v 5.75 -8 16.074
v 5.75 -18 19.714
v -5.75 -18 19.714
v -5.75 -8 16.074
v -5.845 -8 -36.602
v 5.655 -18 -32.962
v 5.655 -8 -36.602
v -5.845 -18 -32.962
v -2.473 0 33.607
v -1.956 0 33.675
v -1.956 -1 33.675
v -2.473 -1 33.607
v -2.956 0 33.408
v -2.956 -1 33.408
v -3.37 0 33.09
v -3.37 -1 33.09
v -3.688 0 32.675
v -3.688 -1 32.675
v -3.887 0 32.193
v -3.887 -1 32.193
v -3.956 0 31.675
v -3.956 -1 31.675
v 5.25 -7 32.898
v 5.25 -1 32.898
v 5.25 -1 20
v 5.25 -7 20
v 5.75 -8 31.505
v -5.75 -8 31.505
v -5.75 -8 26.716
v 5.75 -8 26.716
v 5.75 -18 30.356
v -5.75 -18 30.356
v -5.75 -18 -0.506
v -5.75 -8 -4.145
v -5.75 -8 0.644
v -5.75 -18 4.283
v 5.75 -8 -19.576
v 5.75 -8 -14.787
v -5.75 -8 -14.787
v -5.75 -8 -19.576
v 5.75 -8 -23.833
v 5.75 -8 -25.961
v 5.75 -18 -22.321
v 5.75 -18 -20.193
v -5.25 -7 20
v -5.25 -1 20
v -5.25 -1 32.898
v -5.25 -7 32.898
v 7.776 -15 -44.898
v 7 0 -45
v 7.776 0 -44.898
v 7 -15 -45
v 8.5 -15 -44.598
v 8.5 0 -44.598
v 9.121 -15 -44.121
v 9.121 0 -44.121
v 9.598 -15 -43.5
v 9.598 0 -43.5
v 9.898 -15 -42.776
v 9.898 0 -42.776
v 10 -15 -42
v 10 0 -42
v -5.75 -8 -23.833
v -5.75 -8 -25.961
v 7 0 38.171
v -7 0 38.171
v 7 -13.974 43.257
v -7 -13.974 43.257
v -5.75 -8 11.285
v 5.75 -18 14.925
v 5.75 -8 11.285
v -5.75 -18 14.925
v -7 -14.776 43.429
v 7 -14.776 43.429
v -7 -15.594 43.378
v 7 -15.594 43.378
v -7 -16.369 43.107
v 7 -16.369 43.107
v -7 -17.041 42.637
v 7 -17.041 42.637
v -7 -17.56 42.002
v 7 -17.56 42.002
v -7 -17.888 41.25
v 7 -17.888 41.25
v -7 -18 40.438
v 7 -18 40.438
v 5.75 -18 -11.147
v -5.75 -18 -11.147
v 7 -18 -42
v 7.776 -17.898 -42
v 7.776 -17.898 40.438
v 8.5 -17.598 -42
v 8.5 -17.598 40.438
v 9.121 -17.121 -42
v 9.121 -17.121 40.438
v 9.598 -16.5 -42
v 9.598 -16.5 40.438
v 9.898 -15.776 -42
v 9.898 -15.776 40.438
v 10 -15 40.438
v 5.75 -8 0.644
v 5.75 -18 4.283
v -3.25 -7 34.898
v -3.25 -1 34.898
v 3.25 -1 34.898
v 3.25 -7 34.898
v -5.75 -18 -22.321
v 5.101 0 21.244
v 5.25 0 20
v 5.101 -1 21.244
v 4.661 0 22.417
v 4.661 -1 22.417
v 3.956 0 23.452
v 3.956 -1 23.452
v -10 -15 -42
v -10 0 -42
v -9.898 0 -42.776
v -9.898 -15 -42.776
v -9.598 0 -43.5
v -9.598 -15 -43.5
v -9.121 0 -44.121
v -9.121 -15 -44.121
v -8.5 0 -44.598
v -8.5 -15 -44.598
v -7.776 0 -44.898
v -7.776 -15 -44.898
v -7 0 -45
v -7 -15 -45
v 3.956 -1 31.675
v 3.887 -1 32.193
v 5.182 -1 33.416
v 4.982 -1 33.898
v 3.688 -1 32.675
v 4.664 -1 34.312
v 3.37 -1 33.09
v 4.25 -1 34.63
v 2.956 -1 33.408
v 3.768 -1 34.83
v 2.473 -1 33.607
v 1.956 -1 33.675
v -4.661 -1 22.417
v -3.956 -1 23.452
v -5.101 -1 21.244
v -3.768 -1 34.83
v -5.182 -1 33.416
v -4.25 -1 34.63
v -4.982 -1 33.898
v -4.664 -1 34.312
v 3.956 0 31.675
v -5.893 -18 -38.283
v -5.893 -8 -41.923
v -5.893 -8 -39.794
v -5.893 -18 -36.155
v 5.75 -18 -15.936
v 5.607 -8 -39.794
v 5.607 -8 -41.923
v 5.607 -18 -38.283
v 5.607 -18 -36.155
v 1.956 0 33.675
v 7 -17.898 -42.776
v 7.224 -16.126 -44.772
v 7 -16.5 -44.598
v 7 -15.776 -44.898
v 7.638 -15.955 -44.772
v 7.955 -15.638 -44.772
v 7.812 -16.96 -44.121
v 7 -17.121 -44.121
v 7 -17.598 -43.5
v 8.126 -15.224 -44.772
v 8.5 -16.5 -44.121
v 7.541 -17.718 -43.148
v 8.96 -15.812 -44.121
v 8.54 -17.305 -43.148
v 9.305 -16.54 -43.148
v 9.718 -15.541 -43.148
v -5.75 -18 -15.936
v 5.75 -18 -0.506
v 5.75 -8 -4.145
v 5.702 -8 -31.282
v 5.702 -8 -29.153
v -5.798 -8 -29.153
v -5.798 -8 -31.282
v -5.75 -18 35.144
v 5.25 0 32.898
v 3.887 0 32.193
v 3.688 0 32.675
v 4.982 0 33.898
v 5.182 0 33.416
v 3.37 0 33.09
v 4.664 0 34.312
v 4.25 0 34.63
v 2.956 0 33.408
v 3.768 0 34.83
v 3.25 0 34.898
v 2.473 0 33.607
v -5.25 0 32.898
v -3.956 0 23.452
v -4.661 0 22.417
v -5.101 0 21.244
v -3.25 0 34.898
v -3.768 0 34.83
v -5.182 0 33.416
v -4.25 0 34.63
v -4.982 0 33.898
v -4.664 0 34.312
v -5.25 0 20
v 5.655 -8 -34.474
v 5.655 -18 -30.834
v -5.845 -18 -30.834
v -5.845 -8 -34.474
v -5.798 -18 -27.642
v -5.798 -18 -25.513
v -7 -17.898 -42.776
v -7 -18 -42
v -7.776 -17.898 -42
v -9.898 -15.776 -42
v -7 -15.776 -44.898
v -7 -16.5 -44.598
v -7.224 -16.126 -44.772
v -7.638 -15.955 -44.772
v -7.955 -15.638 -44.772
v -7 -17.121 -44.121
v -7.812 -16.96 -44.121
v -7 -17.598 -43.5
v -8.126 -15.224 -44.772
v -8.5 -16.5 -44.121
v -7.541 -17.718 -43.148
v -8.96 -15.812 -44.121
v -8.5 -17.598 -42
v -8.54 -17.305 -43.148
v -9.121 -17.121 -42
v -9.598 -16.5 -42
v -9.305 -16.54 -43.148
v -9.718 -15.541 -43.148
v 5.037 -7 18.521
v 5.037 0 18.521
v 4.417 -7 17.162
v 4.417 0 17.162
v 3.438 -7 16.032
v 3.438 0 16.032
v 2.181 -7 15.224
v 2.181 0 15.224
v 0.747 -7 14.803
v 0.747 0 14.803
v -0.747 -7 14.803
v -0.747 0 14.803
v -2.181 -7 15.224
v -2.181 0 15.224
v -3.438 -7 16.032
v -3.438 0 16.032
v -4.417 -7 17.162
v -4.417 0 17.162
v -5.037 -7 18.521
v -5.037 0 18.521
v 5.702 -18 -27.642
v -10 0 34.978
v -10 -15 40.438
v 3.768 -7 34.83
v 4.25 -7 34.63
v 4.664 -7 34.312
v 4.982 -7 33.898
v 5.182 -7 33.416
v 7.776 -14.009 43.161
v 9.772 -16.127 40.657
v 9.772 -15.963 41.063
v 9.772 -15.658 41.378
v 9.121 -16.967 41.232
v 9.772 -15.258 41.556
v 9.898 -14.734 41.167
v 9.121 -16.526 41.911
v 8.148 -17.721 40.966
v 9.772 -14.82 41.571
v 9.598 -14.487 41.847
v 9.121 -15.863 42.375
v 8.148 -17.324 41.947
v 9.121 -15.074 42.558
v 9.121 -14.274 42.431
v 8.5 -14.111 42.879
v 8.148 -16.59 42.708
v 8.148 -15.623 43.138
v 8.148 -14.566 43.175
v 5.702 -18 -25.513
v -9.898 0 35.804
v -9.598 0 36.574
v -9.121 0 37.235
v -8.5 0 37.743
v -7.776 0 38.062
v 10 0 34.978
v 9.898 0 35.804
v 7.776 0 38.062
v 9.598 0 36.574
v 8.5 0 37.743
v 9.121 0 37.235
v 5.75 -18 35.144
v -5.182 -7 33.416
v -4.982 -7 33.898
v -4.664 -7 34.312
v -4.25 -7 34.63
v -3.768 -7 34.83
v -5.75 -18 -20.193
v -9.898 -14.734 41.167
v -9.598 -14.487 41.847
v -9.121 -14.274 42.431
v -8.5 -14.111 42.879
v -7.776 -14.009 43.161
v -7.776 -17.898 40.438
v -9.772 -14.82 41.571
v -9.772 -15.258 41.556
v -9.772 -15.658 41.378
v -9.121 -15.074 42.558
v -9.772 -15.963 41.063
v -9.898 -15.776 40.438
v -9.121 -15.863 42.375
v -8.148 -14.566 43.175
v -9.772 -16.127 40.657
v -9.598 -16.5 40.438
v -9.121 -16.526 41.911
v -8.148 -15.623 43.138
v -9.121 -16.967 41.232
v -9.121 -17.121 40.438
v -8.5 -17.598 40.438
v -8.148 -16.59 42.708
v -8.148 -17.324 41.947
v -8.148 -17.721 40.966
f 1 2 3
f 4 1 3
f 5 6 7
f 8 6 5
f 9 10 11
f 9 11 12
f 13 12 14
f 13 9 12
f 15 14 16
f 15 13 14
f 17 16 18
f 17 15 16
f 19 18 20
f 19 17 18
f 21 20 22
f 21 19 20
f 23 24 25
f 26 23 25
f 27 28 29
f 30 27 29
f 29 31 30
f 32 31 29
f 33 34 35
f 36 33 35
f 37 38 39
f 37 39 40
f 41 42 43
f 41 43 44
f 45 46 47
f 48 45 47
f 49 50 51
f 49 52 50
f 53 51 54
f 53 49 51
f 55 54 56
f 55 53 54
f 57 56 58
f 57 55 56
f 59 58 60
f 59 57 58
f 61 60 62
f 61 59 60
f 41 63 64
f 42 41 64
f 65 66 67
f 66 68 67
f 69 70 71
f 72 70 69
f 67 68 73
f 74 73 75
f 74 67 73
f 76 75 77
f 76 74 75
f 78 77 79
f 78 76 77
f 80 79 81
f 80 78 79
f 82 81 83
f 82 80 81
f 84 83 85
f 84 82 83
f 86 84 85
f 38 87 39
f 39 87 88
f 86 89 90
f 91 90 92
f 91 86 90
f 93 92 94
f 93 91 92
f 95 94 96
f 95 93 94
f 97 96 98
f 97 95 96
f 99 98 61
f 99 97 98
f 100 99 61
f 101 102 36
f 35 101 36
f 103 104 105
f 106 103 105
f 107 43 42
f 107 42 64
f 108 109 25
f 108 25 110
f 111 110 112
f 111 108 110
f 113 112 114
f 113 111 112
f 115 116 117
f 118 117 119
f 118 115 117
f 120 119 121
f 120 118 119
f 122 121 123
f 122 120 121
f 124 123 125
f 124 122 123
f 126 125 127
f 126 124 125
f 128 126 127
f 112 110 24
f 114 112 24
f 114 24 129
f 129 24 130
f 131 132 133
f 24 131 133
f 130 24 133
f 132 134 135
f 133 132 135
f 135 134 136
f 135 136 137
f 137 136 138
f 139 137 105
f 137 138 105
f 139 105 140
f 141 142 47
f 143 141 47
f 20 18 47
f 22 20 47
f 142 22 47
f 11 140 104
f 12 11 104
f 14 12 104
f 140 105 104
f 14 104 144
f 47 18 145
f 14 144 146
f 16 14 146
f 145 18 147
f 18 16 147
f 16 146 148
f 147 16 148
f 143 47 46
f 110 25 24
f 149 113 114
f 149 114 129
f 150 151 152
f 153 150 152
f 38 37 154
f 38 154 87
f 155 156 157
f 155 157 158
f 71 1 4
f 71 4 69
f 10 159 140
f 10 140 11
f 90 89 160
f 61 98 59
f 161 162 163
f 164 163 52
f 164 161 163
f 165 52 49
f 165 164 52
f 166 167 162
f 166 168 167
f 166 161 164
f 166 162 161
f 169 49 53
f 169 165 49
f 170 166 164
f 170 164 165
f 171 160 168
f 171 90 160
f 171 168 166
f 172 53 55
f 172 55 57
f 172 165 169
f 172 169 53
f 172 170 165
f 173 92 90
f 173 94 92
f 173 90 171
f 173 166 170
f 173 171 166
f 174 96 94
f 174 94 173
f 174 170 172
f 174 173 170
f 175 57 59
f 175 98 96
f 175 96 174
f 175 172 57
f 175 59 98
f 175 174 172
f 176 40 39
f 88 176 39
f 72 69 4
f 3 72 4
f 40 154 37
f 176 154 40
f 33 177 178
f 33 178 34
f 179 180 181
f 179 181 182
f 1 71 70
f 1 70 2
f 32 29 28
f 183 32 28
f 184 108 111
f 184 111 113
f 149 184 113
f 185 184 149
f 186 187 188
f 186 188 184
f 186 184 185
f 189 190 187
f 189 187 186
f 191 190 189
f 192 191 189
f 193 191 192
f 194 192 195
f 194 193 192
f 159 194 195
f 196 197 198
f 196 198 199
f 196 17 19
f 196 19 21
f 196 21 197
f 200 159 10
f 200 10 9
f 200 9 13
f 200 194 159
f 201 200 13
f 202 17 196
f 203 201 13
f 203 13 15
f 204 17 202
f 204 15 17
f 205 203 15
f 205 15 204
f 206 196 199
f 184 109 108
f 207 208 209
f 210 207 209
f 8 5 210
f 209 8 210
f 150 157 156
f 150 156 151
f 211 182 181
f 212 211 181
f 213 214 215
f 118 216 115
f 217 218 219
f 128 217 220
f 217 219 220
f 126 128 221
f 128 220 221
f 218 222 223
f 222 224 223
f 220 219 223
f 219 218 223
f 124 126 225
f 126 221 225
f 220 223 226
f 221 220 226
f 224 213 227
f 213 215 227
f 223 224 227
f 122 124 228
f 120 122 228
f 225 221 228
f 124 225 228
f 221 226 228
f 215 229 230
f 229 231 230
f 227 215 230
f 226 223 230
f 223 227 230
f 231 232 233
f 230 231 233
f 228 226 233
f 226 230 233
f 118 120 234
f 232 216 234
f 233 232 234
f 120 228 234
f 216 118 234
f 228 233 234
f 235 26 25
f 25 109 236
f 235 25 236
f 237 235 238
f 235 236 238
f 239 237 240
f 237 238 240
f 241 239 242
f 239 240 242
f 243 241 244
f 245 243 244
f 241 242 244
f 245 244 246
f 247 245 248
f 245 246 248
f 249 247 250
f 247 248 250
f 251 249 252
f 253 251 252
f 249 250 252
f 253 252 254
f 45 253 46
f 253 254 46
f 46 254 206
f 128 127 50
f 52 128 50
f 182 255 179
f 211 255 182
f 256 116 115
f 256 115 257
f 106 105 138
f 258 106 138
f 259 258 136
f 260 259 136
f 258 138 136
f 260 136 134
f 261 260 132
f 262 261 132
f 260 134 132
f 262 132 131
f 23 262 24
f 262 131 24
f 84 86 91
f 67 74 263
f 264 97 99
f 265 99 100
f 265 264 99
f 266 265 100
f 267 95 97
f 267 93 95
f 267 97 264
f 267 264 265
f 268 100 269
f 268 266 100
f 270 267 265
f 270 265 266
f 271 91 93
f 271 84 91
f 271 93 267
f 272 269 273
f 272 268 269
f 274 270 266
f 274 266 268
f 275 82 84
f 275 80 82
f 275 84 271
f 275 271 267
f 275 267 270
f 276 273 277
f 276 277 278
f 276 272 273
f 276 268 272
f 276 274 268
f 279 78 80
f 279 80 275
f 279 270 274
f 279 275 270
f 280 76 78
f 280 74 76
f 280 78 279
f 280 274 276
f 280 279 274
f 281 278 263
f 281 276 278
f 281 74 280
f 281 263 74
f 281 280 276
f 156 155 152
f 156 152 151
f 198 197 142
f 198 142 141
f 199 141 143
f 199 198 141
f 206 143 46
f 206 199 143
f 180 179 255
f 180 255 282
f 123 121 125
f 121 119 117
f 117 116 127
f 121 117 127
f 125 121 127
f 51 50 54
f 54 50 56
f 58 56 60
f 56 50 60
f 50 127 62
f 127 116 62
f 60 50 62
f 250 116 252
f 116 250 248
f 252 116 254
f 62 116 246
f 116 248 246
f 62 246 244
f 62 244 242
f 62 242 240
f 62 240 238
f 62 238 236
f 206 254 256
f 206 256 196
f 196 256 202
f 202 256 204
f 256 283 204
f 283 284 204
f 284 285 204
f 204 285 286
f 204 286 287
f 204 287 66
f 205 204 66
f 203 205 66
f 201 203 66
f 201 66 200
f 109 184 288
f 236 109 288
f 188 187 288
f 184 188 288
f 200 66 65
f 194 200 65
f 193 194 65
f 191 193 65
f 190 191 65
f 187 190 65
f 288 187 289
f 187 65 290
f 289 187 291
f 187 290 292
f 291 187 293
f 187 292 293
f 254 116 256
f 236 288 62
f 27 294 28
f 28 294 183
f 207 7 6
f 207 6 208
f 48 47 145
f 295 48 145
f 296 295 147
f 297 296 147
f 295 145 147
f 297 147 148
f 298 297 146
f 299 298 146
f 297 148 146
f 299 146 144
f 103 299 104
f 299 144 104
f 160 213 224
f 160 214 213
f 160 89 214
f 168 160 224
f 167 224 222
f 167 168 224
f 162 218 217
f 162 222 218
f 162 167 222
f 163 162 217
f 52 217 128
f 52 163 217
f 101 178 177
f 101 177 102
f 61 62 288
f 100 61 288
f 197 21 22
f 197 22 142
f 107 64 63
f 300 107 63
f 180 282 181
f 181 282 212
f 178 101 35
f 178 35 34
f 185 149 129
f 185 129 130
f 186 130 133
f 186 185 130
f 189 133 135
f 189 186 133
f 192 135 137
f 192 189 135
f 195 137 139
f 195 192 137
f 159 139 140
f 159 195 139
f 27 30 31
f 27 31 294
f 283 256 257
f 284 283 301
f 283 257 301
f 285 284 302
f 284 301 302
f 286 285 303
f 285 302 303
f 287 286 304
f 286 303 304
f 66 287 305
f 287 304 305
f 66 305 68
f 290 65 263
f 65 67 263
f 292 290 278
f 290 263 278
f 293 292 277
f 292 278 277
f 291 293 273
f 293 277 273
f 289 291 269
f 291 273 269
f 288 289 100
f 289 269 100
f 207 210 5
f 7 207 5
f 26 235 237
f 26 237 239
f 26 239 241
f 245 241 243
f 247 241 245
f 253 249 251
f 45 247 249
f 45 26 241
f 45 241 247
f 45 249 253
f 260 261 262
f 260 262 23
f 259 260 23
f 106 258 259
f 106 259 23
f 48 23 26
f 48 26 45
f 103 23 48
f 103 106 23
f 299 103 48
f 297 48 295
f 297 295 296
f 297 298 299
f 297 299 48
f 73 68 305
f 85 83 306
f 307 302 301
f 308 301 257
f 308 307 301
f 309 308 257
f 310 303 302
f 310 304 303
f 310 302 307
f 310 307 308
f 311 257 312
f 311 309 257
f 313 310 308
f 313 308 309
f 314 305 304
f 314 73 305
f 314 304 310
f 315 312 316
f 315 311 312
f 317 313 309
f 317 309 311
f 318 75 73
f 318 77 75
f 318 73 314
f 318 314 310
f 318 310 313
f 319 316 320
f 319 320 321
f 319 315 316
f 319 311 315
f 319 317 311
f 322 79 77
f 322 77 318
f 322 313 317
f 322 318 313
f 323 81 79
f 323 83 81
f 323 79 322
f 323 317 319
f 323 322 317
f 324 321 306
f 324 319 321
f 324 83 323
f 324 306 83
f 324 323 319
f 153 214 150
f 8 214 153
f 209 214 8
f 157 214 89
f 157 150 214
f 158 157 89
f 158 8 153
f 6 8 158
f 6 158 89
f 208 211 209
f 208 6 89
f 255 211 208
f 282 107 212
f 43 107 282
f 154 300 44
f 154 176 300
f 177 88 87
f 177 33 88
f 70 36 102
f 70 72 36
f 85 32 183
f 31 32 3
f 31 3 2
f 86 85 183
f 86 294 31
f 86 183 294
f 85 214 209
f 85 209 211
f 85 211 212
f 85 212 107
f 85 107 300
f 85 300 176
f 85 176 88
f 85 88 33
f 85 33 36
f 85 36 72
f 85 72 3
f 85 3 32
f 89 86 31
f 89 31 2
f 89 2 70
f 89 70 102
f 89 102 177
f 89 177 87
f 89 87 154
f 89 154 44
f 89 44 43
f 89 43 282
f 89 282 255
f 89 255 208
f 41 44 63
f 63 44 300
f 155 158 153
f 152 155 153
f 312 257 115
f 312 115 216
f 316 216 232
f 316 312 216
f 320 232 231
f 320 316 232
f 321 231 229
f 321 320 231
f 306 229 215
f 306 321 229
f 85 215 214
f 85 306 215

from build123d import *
from build123d import SkipClean  # not in build123d's __all__

# Parameters (mm, degrees)
F0_W      = 20
F0_H      = 90
F1_DEPTH  = 18
F4_W      = 11.5
F4_H      = 4.5
F4_H_2    = 2
F6_REACH  = 51.4753785472
F8_W      = 43.5633249581
F8_H      = 43.13050583
F9_DEPTH  = 16.4
F10_R     = 3
F12_DEPTH = 7
F13_DEPTH = 1


with BuildPart() as f1:
    # F0 (on Front) → F1 (new body)
    with BuildSketch(Plane.XZ):
        Rectangle(F0_W, F0_H)
    extrude(amount=F1_DEPTH)

    f6_end = Plane(origin=(0, -8, 0), x_dir=(0, 0, -1), z_dir=(0, -1, 0))
    # F4 (on face) → F6 (cut, up to a plane its end follows)
    with BuildSketch(Plane(origin=(0, -30.357121206, 11.049088517), x_dir=(-1, 0, 0), z_dir=(0, 0.9396926208, -0.3420201433))):
        with Locations((0, 24.6185707509)):
            Rectangle(F4_W, F4_H)
        with Locations((0, 10.1185707509)):
            Rectangle(F4_W, F4_H)
        with Locations((0, -4.3814292491)):
            Rectangle(F4_W, F4_H)
        with Locations((0, -18.8814292491)):
            Rectangle(F4_W, F4_H)
        with Locations((0, -26.1314292491)):
            Rectangle(F4_W, F4_H_2)
        with Locations((0.0476672364, -31.1312020274)):
            Rectangle(F4_W, F4_H_2)
        with Locations((0.0953344728, -36.1309748057)):
            Rectangle(F4_W, F4_H_2)
        with Locations((0.1430017093, -41.130747584)):
            Rectangle(F4_W, F4_H_2)
    f6_long = extrude(amount=F6_REACH, mode=Mode.PRIVATE)
    add(split(f6_long, bisect_by=f6_end, keep=Keep.TOP, mode=Mode.PRIVATE), mode=Mode.SUBTRACT)

    # F8 (on offset) → F9 (cut)
    with BuildSketch(Plane(origin=(0, 12.2677737091, 33.7054312527), x_dir=(1, 0, 0), z_dir=(0, -0.3420201433, -0.9396926208))):
        with Locations((0, 21.565252915)):
            Rectangle(F8_W, F8_H)
    extrude(amount=-F9_DEPTH, mode=Mode.SUBTRACT)

    # F10
    f10_edges = [f1.edges().sort_by_distance(p)[0] for p in [
        (-10, -18, -0.139),
        (0, -18, 44.722),
        (10, -18, -0.139),
        (0, -18, -45),
        (-10, -9, 41.446268),
        (10, -9, 41.446268),
        (-10, -9, -45),
        (10, -9, -45),
    ]]
    fillet(f10_edges, radius=F10_R)

    # F11 (on face) → F12 (cut)
    with BuildSketch(Plane(origin=(0, 0, 0), x_dir=(-1, 0, 0), z_dir=(0, 1, 0))):
        with BuildLine():
            ThreePointArc((-5.25, 20), (0, 14.75), (5.25, 20))
            ThreePointArc((5.25, 20), (4.9157552788, 21.8433258091), (3.9555809377, 23.4519385054))
            ThreePointArc((3.9555809377, 23.4519385054), (0, 25.25), (-3.9555809377, 23.4519385054))
            ThreePointArc((-3.9555809377, 23.4519385054), (-4.9157552788, 21.8433258091), (-5.25, 20))
        make_face()
        with BuildLine():
            ThreePointArc((3.9555809377, 23.4519385054), (4.9157552788, 21.8433258091), (5.25, 20))
            Line((5.25, 20), (5.25, 32.8980128765))
            ThreePointArc((5.25, 32.8980128765), (4.6642135624, 34.3122264389), (3.25, 34.8980128765))
            Line((3.25, 34.8980128765), (-3.25, 34.8980128765))
            ThreePointArc((-3.25, 34.8980128765), (-4.6642135624, 34.3122264389), (-5.25, 32.8980128765))
            Line((-5.25, 32.8980128765), (-5.25, 20))
            ThreePointArc((-5.25, 20), (-4.9157552788, 21.8433258091), (-3.9555809377, 23.4519385054))
            Line((-3.9555809377, 23.4519385054), (-3.9555809377, 31.6754657328))
            ThreePointArc((-3.9555809377, 31.6754657328), (-3.3697945001, 33.0896792952), (-1.9555809377, 33.6754657328))
            Line((-1.9555809377, 33.6754657328), (1.9555809377, 33.6754657328))
            ThreePointArc((1.9555809377, 33.6754657328), (3.3697945001, 33.0896792952), (3.9555809377, 31.6754657328))
            Line((3.9555809377, 31.6754657328), (3.9555809377, 23.4519385054))
        make_face()
        with BuildLine():
            ThreePointArc((-3.9555809377, 23.4519385054), (0, 25.25), (3.9555809377, 23.4519385054))
            Line((3.9555809377, 23.4519385054), (3.9555809377, 31.6754657328))
            ThreePointArc((3.9555809377, 31.6754657328), (3.3697945001, 33.0896792952), (1.9555809377, 33.6754657328))
            Line((1.9555809377, 33.6754657328), (-1.9555809377, 33.6754657328))
            ThreePointArc((-1.9555809377, 33.6754657328), (-3.3697945001, 33.0896792952), (-3.9555809377, 31.6754657328))
            Line((-3.9555809377, 31.6754657328), (-3.9555809377, 23.4519385054))
        make_face()
    extrude(amount=-F12_DEPTH, mode=Mode.SUBTRACT)

    # F11 (on face) → F13 (join)
    with BuildSketch(Plane(origin=(0, 0, 0), x_dir=(-1, 0, 0), z_dir=(0, 1, 0))):
        with BuildLine():
            ThreePointArc((3.9555809377, 23.4519385054), (4.9157552788, 21.8433258091), (5.25, 20))
            Line((5.25, 20), (5.25, 32.8980128765))
            ThreePointArc((5.25, 32.8980128765), (4.6642135624, 34.3122264389), (3.25, 34.8980128765))
            Line((3.25, 34.8980128765), (-3.25, 34.8980128765))
            ThreePointArc((-3.25, 34.8980128765), (-4.6642135624, 34.3122264389), (-5.25, 32.8980128765))
            Line((-5.25, 32.8980128765), (-5.25, 20))
            ThreePointArc((-5.25, 20), (-4.9157552788, 21.8433258091), (-3.9555809377, 23.4519385054))
            Line((-3.9555809377, 23.4519385054), (-3.9555809377, 31.6754657328))
            ThreePointArc((-3.9555809377, 31.6754657328), (-3.3697945001, 33.0896792952), (-1.9555809377, 33.6754657328))
            Line((-1.9555809377, 33.6754657328), (1.9555809377, 33.6754657328))
            ThreePointArc((1.9555809377, 33.6754657328), (3.3697945001, 33.0896792952), (3.9555809377, 31.6754657328))
            Line((3.9555809377, 31.6754657328), (3.9555809377, 23.4519385054))
        make_face()
    with SkipClean():  # cleaning this boolean's faces spoils the solid; the shape is the same uncleaned
        extrude(amount=-F13_DEPTH)


solid = f1.part
